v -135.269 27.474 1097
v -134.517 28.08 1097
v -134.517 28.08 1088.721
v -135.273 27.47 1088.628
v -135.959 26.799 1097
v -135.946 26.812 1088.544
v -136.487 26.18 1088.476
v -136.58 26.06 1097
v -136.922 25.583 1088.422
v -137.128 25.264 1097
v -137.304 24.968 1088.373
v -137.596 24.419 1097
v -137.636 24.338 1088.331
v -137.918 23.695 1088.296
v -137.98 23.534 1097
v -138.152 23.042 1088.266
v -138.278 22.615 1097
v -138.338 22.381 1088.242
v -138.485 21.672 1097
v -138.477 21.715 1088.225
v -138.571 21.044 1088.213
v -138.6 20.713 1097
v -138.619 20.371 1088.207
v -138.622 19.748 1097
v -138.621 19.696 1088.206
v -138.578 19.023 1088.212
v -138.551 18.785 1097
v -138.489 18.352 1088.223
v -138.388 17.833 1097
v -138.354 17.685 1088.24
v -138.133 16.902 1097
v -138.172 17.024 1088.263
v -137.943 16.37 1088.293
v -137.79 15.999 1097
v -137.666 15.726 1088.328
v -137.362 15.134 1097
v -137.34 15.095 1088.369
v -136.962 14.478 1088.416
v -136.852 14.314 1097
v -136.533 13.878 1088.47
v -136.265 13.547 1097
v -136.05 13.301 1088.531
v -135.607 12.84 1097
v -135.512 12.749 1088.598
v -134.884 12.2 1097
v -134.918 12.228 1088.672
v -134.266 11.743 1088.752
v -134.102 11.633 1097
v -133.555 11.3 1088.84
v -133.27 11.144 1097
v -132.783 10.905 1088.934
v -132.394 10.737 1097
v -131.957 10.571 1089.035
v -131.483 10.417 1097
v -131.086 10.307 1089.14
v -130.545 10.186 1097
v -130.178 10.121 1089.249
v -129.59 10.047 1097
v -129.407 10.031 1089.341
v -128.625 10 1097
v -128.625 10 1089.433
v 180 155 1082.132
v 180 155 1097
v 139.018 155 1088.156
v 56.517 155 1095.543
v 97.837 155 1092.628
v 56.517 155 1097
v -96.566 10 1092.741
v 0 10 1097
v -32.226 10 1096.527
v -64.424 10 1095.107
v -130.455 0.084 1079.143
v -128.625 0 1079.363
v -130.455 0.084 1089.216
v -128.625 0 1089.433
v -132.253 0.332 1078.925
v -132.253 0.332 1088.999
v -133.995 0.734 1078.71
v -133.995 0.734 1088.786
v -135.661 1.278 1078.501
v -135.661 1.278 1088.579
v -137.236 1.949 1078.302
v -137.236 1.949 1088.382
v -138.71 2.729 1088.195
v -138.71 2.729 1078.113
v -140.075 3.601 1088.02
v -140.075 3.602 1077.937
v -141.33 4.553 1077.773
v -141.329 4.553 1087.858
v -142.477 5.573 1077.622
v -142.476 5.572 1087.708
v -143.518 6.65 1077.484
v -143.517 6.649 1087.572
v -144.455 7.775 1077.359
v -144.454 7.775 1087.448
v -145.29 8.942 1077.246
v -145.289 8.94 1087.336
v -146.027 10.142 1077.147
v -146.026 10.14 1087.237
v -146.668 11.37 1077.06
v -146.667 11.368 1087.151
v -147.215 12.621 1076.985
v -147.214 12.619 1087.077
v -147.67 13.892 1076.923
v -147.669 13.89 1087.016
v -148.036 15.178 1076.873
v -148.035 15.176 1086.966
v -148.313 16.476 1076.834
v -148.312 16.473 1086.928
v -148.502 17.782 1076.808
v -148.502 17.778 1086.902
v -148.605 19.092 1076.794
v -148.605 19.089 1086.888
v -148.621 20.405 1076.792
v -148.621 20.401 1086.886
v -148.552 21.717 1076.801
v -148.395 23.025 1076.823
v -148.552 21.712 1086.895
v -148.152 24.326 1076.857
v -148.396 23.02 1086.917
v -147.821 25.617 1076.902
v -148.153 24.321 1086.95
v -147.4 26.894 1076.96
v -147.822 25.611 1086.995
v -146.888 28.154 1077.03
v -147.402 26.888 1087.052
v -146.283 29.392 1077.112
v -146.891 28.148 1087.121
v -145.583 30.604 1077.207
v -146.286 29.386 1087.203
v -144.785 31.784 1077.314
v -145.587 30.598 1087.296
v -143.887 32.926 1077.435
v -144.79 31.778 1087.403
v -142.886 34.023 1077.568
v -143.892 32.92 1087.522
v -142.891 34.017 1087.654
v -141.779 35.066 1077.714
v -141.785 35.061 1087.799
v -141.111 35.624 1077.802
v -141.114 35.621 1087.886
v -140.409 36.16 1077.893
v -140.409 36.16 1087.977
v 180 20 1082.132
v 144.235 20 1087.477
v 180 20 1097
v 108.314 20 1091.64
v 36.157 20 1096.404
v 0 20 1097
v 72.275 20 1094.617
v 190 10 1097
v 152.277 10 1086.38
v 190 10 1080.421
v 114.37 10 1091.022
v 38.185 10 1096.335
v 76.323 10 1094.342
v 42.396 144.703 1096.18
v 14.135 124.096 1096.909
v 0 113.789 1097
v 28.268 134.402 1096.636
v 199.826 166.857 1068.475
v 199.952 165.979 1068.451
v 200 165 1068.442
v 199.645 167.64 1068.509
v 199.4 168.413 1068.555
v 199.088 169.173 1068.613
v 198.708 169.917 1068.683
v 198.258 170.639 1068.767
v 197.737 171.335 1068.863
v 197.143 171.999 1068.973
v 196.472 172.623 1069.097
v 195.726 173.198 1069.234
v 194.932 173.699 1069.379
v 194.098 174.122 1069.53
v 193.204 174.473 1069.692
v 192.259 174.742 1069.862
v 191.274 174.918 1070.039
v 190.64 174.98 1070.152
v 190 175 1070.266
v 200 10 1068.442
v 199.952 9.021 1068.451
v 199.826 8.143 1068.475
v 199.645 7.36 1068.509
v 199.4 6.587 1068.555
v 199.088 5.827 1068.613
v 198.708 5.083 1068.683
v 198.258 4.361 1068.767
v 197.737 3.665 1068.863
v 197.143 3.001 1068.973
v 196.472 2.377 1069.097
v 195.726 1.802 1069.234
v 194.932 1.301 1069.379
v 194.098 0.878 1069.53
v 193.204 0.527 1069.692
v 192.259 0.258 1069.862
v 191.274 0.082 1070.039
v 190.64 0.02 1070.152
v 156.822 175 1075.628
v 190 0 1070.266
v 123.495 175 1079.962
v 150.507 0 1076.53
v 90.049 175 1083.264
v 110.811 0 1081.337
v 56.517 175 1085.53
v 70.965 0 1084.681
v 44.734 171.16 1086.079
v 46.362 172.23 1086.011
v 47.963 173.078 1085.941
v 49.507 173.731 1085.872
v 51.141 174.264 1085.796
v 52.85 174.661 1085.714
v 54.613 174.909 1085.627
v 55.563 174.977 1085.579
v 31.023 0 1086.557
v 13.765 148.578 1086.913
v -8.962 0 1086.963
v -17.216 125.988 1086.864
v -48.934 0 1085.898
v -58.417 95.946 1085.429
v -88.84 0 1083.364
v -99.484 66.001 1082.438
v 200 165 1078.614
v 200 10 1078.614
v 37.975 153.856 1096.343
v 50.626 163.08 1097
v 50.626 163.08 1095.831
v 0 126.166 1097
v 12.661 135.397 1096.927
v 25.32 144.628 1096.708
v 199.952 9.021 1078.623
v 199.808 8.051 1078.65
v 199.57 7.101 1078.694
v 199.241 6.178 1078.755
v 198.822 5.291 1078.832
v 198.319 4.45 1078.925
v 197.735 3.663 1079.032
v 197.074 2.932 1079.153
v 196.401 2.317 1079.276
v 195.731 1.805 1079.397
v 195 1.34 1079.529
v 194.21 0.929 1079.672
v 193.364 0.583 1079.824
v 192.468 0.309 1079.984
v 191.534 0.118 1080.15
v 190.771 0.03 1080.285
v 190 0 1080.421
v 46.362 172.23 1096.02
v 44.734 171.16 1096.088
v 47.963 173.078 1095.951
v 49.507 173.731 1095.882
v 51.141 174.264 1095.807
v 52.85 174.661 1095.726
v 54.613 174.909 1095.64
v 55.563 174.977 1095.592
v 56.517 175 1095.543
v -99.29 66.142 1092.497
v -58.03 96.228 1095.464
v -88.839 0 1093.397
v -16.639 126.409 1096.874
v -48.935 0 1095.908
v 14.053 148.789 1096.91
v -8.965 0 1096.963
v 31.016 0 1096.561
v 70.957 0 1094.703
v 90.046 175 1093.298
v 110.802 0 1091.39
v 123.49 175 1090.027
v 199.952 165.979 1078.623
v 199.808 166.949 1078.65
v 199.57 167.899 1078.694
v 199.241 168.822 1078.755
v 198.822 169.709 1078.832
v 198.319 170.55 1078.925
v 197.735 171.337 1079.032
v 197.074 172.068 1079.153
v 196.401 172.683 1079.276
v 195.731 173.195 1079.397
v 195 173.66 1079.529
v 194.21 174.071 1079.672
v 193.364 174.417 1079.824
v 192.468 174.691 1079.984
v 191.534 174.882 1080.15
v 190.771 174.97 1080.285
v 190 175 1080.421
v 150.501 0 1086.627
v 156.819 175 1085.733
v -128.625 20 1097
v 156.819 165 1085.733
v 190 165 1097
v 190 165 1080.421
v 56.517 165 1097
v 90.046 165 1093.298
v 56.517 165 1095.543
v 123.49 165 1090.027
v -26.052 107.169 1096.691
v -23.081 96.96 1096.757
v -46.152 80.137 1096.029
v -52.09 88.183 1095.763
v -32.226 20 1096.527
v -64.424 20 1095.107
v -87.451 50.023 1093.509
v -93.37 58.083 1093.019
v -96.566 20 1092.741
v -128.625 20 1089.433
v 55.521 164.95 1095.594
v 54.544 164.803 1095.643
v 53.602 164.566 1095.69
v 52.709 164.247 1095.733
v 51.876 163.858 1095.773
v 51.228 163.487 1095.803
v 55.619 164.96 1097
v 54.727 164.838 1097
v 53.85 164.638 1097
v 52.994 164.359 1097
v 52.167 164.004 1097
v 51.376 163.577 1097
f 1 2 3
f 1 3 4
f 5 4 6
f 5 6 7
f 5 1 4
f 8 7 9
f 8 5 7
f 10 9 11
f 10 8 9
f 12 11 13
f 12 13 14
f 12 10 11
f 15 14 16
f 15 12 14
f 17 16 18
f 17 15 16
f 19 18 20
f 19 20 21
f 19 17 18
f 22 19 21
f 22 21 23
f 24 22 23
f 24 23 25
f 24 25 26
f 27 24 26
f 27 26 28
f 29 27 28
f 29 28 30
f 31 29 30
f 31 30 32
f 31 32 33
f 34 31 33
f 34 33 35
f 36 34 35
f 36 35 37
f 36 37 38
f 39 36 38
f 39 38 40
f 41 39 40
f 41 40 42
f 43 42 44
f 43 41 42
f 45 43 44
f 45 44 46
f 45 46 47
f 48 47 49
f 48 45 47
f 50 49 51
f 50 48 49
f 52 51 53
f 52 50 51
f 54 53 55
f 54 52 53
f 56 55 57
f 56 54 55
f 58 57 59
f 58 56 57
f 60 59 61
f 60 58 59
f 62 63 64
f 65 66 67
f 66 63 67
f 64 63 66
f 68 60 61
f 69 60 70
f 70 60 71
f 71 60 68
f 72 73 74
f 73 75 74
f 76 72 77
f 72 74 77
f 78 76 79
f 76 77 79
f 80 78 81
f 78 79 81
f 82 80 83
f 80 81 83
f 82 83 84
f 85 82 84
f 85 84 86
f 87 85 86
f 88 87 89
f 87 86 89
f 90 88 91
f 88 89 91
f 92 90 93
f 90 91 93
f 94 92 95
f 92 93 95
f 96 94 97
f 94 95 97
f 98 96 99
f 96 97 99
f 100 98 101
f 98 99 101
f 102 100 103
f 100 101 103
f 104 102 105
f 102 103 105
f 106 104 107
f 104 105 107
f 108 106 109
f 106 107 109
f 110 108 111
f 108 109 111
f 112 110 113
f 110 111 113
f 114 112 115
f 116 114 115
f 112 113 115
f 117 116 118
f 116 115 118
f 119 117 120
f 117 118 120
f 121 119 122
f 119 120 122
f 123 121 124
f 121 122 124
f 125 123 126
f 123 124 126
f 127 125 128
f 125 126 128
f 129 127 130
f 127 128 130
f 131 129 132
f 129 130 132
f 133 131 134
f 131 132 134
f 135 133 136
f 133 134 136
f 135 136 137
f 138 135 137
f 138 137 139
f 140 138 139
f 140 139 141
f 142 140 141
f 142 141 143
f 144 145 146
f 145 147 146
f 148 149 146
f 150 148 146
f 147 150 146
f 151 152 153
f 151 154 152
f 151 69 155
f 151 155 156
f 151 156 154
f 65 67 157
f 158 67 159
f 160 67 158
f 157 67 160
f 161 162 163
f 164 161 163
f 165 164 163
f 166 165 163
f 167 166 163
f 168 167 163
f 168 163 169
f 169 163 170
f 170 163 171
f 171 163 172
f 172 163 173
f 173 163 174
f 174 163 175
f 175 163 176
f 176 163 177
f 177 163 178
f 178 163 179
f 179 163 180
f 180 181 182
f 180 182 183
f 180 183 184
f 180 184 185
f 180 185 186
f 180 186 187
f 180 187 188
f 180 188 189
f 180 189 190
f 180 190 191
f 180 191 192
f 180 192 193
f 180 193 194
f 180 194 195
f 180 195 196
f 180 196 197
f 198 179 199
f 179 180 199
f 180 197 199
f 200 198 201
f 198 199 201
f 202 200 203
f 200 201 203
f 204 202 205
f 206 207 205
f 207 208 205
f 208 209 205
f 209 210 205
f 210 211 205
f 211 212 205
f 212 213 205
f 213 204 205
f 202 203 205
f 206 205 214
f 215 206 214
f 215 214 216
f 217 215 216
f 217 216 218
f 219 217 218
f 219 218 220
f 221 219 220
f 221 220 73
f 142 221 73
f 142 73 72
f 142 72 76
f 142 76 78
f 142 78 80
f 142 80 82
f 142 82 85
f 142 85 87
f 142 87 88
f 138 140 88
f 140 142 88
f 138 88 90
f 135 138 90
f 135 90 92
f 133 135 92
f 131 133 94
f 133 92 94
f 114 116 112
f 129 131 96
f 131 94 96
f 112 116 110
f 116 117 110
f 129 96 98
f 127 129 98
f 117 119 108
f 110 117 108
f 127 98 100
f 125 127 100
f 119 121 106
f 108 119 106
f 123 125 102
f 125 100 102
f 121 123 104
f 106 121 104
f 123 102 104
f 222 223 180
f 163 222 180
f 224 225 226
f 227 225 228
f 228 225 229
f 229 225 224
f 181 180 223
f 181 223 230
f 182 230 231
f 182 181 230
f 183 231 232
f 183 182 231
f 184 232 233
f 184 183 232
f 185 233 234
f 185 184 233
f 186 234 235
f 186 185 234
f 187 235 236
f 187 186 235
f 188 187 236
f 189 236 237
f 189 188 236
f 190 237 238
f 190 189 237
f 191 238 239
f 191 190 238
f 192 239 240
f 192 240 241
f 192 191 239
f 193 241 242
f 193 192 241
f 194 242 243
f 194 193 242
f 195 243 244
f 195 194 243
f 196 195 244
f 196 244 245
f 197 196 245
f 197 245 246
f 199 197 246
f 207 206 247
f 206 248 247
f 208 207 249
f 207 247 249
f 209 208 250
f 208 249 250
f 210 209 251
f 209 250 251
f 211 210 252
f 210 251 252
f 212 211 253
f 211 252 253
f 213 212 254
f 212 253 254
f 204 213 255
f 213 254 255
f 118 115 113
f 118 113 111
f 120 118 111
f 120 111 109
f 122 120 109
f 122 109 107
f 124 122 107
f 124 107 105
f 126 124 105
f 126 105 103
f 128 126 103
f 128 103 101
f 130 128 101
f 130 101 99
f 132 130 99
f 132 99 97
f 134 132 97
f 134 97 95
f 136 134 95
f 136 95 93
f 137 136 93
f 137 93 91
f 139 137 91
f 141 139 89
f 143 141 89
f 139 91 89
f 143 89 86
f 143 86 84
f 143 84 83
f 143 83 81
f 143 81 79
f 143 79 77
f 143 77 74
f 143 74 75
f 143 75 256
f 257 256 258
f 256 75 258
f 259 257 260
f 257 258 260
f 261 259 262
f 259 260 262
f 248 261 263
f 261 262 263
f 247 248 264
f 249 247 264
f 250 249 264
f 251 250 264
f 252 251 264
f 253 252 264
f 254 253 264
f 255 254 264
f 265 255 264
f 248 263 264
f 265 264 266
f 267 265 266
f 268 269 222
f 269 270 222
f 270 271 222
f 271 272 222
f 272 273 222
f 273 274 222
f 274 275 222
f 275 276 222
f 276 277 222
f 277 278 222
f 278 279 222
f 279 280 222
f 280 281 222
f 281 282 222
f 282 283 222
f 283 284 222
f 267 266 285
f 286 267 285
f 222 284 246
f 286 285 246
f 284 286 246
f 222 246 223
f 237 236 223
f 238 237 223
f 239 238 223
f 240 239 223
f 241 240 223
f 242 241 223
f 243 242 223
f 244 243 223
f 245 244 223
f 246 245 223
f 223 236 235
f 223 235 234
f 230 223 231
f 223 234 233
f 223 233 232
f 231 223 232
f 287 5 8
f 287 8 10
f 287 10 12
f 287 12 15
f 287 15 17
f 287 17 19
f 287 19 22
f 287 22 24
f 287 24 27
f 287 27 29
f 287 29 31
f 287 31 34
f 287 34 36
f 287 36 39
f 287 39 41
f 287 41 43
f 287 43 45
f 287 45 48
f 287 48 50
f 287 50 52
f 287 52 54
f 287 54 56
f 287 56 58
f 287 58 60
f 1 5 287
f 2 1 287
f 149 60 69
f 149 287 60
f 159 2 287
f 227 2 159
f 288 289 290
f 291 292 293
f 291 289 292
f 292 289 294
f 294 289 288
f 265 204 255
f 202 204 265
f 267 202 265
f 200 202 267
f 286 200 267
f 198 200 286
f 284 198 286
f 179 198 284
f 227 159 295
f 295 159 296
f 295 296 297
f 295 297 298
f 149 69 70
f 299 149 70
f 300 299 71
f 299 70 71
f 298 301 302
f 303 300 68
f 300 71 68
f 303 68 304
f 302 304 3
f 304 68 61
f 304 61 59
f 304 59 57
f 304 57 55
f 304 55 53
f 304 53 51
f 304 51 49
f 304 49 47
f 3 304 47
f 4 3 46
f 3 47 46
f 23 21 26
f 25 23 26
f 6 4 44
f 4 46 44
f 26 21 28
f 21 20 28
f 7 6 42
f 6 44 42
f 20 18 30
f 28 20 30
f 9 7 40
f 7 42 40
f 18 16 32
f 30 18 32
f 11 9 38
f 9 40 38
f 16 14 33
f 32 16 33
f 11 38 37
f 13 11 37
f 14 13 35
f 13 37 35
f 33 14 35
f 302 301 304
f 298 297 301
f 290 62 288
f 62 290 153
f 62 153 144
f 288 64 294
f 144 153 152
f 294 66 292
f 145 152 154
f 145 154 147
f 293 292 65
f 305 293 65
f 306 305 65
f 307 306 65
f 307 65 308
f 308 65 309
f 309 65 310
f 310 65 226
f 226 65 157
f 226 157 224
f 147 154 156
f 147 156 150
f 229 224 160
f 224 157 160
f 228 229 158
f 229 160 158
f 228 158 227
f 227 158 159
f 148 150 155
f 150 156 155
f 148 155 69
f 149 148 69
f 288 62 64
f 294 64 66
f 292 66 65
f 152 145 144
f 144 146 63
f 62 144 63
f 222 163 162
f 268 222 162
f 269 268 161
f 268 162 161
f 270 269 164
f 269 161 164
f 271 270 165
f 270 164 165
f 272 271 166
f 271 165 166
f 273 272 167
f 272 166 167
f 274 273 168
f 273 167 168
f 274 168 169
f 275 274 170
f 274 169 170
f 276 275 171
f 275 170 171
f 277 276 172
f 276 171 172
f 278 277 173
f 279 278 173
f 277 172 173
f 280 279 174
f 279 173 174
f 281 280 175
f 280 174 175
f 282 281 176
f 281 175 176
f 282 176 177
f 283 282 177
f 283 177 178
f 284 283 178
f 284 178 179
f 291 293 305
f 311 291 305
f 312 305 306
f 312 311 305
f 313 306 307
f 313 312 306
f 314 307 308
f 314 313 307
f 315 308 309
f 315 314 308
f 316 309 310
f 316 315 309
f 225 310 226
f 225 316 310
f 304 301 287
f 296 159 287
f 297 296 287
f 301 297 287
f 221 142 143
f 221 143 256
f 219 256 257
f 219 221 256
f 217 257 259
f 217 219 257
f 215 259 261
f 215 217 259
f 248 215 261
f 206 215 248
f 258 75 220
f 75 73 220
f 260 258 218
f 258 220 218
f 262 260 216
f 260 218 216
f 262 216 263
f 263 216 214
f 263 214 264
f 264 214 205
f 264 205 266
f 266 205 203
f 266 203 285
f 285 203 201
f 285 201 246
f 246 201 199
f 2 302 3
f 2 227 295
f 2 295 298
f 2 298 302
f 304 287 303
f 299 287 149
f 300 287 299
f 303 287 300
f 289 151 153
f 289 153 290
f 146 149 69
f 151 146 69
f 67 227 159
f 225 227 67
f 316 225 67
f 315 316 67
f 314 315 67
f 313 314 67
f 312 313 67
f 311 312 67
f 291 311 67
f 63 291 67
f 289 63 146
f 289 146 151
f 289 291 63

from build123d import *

# Parameters (mm, degrees)
BOSS_EXTRUDE1_DEPTH      = 175
FILLET1_R                = 10
CUT_EXTRUDE3_DEPTH       = 1129.731146152
CUT_EXTRUDE3_DEPTH_BACK  = 1129.731146152
SKETCH4_OUTSIDE_W        = 489.508
SKETCH4_OUTSIDE_H        = 264.508
FILLET4_R                = 20
BOSS_EXTRUDE3_REACH      = 269.284
BOSS_EXTRUDE3_END_RADIUS = 1097


with BuildPart() as part:
    # Sketch1 → Boss-Extrude1 (new body)
    with BuildSketch(Plane(origin=(0, 0, 0), x_dir=(1, 0, 0), z_dir=(0, 1, 0))):
        with BuildLine():
            Line((-200, -1068.442324134), (-200, -1078.614388927))
            ThreePointArc((-200, -1078.614388927), (0, -1097), (200, -1078.614388927))
            Line((200, -1078.614388927), (200, -1068.442324134))
            ThreePointArc((200, -1068.442324134), (0, -1087), (-200, -1068.442324134))
        make_face()
    extrude(amount=BOSS_EXTRUDE1_DEPTH)

    # Fillet1
    fillet1_edges = [part.edges().sort_by_distance(p)[0] for p in [
        (200, 175, 1073.52835653),
        (200, 0, 1073.52835653),
        (-200, 0, 1073.52835653),
        (-200, 175, 1073.52835653),
    ]]
    fillet(fillet1_edges, radius=FILLET1_R)

    # Sketch4 outside → Cut-Extrude3 (cut, two sides: drawn at the far end of the back side and taken through both)
    with BuildSketch(Plane.XY.offset(-CUT_EXTRUDE3_DEPTH_BACK)):
        with Locations((0, 87.5)):
            Rectangle(SKETCH4_OUTSIDE_W, SKETCH4_OUTSIDE_H)
        Polygon((-190, 0), (50, 175), (200, 175), (200, 0), align=None, mode=Mode.SUBTRACT)
    extrude(amount=CUT_EXTRUDE3_DEPTH + CUT_EXTRUDE3_DEPTH_BACK, mode=Mode.SUBTRACT)

    # Fillet4
    fillet4_edges = [part.edges().sort_by_distance(p)[0] for p in [
        (-190, 0, 1075.343303099),
        (50, 175, 1090.854686691),
    ]]
    fillet(fillet4_edges, radius=FILLET4_R)


with BuildPart() as body_2:
    # Boss-Extrude3: up to this cylinder (the profile starts outside it)
    boss_extrude3_end = Plane(origin=(0, 92.644219, 0), z_dir=(0, -1, 0)) * Cylinder(BOSS_EXTRUDE3_END_RADIUS, 2733.568, mode=Mode.PRIVATE)
    # Sketch5 → Boss-Extrude3 (new, up to the surface)
    with BuildSketch(Plane.XY.offset(1097), mode=Mode.PRIVATE) as boss_extrude3_sk1:
        with BuildLine():
            Line((50.625642403, 163.080075302), (-134.51721474, 28.080075302))
            ThreePointArc((-134.51721474, 28.080075302), (-138.133404424, 16.901674083), (-128.625493165, 10))
            Line((-128.625493165, 10), (190, 10))
            Line((190, 10), (190, 165))
            Line((190, 165), (56.517363978, 165))
            ThreePointArc((56.517363978, 165), (53.419038061, 164.507911259), (50.625642403, 163.080075302))
        make_face()
        Polygon((56.517363978, 155), (-128.625493165, 20), (180, 20), (180, 155), align=None, mode=Mode.SUBTRACT)
    boss_extrude3_tool1 = extrude(boss_extrude3_sk1.sketch, amount=-BOSS_EXTRUDE3_REACH, mode=Mode.PRIVATE) - boss_extrude3_end
    add(boss_extrude3_tool1.solids().sort_by_distance((-39.805058, 92.644219, 1097))[0])
    add(boss_extrude3_tool1.solids().sort_by_distance((-39.805058, 92.644219, 1097))[1])


solid = Compound([part.part, body_2.part])
